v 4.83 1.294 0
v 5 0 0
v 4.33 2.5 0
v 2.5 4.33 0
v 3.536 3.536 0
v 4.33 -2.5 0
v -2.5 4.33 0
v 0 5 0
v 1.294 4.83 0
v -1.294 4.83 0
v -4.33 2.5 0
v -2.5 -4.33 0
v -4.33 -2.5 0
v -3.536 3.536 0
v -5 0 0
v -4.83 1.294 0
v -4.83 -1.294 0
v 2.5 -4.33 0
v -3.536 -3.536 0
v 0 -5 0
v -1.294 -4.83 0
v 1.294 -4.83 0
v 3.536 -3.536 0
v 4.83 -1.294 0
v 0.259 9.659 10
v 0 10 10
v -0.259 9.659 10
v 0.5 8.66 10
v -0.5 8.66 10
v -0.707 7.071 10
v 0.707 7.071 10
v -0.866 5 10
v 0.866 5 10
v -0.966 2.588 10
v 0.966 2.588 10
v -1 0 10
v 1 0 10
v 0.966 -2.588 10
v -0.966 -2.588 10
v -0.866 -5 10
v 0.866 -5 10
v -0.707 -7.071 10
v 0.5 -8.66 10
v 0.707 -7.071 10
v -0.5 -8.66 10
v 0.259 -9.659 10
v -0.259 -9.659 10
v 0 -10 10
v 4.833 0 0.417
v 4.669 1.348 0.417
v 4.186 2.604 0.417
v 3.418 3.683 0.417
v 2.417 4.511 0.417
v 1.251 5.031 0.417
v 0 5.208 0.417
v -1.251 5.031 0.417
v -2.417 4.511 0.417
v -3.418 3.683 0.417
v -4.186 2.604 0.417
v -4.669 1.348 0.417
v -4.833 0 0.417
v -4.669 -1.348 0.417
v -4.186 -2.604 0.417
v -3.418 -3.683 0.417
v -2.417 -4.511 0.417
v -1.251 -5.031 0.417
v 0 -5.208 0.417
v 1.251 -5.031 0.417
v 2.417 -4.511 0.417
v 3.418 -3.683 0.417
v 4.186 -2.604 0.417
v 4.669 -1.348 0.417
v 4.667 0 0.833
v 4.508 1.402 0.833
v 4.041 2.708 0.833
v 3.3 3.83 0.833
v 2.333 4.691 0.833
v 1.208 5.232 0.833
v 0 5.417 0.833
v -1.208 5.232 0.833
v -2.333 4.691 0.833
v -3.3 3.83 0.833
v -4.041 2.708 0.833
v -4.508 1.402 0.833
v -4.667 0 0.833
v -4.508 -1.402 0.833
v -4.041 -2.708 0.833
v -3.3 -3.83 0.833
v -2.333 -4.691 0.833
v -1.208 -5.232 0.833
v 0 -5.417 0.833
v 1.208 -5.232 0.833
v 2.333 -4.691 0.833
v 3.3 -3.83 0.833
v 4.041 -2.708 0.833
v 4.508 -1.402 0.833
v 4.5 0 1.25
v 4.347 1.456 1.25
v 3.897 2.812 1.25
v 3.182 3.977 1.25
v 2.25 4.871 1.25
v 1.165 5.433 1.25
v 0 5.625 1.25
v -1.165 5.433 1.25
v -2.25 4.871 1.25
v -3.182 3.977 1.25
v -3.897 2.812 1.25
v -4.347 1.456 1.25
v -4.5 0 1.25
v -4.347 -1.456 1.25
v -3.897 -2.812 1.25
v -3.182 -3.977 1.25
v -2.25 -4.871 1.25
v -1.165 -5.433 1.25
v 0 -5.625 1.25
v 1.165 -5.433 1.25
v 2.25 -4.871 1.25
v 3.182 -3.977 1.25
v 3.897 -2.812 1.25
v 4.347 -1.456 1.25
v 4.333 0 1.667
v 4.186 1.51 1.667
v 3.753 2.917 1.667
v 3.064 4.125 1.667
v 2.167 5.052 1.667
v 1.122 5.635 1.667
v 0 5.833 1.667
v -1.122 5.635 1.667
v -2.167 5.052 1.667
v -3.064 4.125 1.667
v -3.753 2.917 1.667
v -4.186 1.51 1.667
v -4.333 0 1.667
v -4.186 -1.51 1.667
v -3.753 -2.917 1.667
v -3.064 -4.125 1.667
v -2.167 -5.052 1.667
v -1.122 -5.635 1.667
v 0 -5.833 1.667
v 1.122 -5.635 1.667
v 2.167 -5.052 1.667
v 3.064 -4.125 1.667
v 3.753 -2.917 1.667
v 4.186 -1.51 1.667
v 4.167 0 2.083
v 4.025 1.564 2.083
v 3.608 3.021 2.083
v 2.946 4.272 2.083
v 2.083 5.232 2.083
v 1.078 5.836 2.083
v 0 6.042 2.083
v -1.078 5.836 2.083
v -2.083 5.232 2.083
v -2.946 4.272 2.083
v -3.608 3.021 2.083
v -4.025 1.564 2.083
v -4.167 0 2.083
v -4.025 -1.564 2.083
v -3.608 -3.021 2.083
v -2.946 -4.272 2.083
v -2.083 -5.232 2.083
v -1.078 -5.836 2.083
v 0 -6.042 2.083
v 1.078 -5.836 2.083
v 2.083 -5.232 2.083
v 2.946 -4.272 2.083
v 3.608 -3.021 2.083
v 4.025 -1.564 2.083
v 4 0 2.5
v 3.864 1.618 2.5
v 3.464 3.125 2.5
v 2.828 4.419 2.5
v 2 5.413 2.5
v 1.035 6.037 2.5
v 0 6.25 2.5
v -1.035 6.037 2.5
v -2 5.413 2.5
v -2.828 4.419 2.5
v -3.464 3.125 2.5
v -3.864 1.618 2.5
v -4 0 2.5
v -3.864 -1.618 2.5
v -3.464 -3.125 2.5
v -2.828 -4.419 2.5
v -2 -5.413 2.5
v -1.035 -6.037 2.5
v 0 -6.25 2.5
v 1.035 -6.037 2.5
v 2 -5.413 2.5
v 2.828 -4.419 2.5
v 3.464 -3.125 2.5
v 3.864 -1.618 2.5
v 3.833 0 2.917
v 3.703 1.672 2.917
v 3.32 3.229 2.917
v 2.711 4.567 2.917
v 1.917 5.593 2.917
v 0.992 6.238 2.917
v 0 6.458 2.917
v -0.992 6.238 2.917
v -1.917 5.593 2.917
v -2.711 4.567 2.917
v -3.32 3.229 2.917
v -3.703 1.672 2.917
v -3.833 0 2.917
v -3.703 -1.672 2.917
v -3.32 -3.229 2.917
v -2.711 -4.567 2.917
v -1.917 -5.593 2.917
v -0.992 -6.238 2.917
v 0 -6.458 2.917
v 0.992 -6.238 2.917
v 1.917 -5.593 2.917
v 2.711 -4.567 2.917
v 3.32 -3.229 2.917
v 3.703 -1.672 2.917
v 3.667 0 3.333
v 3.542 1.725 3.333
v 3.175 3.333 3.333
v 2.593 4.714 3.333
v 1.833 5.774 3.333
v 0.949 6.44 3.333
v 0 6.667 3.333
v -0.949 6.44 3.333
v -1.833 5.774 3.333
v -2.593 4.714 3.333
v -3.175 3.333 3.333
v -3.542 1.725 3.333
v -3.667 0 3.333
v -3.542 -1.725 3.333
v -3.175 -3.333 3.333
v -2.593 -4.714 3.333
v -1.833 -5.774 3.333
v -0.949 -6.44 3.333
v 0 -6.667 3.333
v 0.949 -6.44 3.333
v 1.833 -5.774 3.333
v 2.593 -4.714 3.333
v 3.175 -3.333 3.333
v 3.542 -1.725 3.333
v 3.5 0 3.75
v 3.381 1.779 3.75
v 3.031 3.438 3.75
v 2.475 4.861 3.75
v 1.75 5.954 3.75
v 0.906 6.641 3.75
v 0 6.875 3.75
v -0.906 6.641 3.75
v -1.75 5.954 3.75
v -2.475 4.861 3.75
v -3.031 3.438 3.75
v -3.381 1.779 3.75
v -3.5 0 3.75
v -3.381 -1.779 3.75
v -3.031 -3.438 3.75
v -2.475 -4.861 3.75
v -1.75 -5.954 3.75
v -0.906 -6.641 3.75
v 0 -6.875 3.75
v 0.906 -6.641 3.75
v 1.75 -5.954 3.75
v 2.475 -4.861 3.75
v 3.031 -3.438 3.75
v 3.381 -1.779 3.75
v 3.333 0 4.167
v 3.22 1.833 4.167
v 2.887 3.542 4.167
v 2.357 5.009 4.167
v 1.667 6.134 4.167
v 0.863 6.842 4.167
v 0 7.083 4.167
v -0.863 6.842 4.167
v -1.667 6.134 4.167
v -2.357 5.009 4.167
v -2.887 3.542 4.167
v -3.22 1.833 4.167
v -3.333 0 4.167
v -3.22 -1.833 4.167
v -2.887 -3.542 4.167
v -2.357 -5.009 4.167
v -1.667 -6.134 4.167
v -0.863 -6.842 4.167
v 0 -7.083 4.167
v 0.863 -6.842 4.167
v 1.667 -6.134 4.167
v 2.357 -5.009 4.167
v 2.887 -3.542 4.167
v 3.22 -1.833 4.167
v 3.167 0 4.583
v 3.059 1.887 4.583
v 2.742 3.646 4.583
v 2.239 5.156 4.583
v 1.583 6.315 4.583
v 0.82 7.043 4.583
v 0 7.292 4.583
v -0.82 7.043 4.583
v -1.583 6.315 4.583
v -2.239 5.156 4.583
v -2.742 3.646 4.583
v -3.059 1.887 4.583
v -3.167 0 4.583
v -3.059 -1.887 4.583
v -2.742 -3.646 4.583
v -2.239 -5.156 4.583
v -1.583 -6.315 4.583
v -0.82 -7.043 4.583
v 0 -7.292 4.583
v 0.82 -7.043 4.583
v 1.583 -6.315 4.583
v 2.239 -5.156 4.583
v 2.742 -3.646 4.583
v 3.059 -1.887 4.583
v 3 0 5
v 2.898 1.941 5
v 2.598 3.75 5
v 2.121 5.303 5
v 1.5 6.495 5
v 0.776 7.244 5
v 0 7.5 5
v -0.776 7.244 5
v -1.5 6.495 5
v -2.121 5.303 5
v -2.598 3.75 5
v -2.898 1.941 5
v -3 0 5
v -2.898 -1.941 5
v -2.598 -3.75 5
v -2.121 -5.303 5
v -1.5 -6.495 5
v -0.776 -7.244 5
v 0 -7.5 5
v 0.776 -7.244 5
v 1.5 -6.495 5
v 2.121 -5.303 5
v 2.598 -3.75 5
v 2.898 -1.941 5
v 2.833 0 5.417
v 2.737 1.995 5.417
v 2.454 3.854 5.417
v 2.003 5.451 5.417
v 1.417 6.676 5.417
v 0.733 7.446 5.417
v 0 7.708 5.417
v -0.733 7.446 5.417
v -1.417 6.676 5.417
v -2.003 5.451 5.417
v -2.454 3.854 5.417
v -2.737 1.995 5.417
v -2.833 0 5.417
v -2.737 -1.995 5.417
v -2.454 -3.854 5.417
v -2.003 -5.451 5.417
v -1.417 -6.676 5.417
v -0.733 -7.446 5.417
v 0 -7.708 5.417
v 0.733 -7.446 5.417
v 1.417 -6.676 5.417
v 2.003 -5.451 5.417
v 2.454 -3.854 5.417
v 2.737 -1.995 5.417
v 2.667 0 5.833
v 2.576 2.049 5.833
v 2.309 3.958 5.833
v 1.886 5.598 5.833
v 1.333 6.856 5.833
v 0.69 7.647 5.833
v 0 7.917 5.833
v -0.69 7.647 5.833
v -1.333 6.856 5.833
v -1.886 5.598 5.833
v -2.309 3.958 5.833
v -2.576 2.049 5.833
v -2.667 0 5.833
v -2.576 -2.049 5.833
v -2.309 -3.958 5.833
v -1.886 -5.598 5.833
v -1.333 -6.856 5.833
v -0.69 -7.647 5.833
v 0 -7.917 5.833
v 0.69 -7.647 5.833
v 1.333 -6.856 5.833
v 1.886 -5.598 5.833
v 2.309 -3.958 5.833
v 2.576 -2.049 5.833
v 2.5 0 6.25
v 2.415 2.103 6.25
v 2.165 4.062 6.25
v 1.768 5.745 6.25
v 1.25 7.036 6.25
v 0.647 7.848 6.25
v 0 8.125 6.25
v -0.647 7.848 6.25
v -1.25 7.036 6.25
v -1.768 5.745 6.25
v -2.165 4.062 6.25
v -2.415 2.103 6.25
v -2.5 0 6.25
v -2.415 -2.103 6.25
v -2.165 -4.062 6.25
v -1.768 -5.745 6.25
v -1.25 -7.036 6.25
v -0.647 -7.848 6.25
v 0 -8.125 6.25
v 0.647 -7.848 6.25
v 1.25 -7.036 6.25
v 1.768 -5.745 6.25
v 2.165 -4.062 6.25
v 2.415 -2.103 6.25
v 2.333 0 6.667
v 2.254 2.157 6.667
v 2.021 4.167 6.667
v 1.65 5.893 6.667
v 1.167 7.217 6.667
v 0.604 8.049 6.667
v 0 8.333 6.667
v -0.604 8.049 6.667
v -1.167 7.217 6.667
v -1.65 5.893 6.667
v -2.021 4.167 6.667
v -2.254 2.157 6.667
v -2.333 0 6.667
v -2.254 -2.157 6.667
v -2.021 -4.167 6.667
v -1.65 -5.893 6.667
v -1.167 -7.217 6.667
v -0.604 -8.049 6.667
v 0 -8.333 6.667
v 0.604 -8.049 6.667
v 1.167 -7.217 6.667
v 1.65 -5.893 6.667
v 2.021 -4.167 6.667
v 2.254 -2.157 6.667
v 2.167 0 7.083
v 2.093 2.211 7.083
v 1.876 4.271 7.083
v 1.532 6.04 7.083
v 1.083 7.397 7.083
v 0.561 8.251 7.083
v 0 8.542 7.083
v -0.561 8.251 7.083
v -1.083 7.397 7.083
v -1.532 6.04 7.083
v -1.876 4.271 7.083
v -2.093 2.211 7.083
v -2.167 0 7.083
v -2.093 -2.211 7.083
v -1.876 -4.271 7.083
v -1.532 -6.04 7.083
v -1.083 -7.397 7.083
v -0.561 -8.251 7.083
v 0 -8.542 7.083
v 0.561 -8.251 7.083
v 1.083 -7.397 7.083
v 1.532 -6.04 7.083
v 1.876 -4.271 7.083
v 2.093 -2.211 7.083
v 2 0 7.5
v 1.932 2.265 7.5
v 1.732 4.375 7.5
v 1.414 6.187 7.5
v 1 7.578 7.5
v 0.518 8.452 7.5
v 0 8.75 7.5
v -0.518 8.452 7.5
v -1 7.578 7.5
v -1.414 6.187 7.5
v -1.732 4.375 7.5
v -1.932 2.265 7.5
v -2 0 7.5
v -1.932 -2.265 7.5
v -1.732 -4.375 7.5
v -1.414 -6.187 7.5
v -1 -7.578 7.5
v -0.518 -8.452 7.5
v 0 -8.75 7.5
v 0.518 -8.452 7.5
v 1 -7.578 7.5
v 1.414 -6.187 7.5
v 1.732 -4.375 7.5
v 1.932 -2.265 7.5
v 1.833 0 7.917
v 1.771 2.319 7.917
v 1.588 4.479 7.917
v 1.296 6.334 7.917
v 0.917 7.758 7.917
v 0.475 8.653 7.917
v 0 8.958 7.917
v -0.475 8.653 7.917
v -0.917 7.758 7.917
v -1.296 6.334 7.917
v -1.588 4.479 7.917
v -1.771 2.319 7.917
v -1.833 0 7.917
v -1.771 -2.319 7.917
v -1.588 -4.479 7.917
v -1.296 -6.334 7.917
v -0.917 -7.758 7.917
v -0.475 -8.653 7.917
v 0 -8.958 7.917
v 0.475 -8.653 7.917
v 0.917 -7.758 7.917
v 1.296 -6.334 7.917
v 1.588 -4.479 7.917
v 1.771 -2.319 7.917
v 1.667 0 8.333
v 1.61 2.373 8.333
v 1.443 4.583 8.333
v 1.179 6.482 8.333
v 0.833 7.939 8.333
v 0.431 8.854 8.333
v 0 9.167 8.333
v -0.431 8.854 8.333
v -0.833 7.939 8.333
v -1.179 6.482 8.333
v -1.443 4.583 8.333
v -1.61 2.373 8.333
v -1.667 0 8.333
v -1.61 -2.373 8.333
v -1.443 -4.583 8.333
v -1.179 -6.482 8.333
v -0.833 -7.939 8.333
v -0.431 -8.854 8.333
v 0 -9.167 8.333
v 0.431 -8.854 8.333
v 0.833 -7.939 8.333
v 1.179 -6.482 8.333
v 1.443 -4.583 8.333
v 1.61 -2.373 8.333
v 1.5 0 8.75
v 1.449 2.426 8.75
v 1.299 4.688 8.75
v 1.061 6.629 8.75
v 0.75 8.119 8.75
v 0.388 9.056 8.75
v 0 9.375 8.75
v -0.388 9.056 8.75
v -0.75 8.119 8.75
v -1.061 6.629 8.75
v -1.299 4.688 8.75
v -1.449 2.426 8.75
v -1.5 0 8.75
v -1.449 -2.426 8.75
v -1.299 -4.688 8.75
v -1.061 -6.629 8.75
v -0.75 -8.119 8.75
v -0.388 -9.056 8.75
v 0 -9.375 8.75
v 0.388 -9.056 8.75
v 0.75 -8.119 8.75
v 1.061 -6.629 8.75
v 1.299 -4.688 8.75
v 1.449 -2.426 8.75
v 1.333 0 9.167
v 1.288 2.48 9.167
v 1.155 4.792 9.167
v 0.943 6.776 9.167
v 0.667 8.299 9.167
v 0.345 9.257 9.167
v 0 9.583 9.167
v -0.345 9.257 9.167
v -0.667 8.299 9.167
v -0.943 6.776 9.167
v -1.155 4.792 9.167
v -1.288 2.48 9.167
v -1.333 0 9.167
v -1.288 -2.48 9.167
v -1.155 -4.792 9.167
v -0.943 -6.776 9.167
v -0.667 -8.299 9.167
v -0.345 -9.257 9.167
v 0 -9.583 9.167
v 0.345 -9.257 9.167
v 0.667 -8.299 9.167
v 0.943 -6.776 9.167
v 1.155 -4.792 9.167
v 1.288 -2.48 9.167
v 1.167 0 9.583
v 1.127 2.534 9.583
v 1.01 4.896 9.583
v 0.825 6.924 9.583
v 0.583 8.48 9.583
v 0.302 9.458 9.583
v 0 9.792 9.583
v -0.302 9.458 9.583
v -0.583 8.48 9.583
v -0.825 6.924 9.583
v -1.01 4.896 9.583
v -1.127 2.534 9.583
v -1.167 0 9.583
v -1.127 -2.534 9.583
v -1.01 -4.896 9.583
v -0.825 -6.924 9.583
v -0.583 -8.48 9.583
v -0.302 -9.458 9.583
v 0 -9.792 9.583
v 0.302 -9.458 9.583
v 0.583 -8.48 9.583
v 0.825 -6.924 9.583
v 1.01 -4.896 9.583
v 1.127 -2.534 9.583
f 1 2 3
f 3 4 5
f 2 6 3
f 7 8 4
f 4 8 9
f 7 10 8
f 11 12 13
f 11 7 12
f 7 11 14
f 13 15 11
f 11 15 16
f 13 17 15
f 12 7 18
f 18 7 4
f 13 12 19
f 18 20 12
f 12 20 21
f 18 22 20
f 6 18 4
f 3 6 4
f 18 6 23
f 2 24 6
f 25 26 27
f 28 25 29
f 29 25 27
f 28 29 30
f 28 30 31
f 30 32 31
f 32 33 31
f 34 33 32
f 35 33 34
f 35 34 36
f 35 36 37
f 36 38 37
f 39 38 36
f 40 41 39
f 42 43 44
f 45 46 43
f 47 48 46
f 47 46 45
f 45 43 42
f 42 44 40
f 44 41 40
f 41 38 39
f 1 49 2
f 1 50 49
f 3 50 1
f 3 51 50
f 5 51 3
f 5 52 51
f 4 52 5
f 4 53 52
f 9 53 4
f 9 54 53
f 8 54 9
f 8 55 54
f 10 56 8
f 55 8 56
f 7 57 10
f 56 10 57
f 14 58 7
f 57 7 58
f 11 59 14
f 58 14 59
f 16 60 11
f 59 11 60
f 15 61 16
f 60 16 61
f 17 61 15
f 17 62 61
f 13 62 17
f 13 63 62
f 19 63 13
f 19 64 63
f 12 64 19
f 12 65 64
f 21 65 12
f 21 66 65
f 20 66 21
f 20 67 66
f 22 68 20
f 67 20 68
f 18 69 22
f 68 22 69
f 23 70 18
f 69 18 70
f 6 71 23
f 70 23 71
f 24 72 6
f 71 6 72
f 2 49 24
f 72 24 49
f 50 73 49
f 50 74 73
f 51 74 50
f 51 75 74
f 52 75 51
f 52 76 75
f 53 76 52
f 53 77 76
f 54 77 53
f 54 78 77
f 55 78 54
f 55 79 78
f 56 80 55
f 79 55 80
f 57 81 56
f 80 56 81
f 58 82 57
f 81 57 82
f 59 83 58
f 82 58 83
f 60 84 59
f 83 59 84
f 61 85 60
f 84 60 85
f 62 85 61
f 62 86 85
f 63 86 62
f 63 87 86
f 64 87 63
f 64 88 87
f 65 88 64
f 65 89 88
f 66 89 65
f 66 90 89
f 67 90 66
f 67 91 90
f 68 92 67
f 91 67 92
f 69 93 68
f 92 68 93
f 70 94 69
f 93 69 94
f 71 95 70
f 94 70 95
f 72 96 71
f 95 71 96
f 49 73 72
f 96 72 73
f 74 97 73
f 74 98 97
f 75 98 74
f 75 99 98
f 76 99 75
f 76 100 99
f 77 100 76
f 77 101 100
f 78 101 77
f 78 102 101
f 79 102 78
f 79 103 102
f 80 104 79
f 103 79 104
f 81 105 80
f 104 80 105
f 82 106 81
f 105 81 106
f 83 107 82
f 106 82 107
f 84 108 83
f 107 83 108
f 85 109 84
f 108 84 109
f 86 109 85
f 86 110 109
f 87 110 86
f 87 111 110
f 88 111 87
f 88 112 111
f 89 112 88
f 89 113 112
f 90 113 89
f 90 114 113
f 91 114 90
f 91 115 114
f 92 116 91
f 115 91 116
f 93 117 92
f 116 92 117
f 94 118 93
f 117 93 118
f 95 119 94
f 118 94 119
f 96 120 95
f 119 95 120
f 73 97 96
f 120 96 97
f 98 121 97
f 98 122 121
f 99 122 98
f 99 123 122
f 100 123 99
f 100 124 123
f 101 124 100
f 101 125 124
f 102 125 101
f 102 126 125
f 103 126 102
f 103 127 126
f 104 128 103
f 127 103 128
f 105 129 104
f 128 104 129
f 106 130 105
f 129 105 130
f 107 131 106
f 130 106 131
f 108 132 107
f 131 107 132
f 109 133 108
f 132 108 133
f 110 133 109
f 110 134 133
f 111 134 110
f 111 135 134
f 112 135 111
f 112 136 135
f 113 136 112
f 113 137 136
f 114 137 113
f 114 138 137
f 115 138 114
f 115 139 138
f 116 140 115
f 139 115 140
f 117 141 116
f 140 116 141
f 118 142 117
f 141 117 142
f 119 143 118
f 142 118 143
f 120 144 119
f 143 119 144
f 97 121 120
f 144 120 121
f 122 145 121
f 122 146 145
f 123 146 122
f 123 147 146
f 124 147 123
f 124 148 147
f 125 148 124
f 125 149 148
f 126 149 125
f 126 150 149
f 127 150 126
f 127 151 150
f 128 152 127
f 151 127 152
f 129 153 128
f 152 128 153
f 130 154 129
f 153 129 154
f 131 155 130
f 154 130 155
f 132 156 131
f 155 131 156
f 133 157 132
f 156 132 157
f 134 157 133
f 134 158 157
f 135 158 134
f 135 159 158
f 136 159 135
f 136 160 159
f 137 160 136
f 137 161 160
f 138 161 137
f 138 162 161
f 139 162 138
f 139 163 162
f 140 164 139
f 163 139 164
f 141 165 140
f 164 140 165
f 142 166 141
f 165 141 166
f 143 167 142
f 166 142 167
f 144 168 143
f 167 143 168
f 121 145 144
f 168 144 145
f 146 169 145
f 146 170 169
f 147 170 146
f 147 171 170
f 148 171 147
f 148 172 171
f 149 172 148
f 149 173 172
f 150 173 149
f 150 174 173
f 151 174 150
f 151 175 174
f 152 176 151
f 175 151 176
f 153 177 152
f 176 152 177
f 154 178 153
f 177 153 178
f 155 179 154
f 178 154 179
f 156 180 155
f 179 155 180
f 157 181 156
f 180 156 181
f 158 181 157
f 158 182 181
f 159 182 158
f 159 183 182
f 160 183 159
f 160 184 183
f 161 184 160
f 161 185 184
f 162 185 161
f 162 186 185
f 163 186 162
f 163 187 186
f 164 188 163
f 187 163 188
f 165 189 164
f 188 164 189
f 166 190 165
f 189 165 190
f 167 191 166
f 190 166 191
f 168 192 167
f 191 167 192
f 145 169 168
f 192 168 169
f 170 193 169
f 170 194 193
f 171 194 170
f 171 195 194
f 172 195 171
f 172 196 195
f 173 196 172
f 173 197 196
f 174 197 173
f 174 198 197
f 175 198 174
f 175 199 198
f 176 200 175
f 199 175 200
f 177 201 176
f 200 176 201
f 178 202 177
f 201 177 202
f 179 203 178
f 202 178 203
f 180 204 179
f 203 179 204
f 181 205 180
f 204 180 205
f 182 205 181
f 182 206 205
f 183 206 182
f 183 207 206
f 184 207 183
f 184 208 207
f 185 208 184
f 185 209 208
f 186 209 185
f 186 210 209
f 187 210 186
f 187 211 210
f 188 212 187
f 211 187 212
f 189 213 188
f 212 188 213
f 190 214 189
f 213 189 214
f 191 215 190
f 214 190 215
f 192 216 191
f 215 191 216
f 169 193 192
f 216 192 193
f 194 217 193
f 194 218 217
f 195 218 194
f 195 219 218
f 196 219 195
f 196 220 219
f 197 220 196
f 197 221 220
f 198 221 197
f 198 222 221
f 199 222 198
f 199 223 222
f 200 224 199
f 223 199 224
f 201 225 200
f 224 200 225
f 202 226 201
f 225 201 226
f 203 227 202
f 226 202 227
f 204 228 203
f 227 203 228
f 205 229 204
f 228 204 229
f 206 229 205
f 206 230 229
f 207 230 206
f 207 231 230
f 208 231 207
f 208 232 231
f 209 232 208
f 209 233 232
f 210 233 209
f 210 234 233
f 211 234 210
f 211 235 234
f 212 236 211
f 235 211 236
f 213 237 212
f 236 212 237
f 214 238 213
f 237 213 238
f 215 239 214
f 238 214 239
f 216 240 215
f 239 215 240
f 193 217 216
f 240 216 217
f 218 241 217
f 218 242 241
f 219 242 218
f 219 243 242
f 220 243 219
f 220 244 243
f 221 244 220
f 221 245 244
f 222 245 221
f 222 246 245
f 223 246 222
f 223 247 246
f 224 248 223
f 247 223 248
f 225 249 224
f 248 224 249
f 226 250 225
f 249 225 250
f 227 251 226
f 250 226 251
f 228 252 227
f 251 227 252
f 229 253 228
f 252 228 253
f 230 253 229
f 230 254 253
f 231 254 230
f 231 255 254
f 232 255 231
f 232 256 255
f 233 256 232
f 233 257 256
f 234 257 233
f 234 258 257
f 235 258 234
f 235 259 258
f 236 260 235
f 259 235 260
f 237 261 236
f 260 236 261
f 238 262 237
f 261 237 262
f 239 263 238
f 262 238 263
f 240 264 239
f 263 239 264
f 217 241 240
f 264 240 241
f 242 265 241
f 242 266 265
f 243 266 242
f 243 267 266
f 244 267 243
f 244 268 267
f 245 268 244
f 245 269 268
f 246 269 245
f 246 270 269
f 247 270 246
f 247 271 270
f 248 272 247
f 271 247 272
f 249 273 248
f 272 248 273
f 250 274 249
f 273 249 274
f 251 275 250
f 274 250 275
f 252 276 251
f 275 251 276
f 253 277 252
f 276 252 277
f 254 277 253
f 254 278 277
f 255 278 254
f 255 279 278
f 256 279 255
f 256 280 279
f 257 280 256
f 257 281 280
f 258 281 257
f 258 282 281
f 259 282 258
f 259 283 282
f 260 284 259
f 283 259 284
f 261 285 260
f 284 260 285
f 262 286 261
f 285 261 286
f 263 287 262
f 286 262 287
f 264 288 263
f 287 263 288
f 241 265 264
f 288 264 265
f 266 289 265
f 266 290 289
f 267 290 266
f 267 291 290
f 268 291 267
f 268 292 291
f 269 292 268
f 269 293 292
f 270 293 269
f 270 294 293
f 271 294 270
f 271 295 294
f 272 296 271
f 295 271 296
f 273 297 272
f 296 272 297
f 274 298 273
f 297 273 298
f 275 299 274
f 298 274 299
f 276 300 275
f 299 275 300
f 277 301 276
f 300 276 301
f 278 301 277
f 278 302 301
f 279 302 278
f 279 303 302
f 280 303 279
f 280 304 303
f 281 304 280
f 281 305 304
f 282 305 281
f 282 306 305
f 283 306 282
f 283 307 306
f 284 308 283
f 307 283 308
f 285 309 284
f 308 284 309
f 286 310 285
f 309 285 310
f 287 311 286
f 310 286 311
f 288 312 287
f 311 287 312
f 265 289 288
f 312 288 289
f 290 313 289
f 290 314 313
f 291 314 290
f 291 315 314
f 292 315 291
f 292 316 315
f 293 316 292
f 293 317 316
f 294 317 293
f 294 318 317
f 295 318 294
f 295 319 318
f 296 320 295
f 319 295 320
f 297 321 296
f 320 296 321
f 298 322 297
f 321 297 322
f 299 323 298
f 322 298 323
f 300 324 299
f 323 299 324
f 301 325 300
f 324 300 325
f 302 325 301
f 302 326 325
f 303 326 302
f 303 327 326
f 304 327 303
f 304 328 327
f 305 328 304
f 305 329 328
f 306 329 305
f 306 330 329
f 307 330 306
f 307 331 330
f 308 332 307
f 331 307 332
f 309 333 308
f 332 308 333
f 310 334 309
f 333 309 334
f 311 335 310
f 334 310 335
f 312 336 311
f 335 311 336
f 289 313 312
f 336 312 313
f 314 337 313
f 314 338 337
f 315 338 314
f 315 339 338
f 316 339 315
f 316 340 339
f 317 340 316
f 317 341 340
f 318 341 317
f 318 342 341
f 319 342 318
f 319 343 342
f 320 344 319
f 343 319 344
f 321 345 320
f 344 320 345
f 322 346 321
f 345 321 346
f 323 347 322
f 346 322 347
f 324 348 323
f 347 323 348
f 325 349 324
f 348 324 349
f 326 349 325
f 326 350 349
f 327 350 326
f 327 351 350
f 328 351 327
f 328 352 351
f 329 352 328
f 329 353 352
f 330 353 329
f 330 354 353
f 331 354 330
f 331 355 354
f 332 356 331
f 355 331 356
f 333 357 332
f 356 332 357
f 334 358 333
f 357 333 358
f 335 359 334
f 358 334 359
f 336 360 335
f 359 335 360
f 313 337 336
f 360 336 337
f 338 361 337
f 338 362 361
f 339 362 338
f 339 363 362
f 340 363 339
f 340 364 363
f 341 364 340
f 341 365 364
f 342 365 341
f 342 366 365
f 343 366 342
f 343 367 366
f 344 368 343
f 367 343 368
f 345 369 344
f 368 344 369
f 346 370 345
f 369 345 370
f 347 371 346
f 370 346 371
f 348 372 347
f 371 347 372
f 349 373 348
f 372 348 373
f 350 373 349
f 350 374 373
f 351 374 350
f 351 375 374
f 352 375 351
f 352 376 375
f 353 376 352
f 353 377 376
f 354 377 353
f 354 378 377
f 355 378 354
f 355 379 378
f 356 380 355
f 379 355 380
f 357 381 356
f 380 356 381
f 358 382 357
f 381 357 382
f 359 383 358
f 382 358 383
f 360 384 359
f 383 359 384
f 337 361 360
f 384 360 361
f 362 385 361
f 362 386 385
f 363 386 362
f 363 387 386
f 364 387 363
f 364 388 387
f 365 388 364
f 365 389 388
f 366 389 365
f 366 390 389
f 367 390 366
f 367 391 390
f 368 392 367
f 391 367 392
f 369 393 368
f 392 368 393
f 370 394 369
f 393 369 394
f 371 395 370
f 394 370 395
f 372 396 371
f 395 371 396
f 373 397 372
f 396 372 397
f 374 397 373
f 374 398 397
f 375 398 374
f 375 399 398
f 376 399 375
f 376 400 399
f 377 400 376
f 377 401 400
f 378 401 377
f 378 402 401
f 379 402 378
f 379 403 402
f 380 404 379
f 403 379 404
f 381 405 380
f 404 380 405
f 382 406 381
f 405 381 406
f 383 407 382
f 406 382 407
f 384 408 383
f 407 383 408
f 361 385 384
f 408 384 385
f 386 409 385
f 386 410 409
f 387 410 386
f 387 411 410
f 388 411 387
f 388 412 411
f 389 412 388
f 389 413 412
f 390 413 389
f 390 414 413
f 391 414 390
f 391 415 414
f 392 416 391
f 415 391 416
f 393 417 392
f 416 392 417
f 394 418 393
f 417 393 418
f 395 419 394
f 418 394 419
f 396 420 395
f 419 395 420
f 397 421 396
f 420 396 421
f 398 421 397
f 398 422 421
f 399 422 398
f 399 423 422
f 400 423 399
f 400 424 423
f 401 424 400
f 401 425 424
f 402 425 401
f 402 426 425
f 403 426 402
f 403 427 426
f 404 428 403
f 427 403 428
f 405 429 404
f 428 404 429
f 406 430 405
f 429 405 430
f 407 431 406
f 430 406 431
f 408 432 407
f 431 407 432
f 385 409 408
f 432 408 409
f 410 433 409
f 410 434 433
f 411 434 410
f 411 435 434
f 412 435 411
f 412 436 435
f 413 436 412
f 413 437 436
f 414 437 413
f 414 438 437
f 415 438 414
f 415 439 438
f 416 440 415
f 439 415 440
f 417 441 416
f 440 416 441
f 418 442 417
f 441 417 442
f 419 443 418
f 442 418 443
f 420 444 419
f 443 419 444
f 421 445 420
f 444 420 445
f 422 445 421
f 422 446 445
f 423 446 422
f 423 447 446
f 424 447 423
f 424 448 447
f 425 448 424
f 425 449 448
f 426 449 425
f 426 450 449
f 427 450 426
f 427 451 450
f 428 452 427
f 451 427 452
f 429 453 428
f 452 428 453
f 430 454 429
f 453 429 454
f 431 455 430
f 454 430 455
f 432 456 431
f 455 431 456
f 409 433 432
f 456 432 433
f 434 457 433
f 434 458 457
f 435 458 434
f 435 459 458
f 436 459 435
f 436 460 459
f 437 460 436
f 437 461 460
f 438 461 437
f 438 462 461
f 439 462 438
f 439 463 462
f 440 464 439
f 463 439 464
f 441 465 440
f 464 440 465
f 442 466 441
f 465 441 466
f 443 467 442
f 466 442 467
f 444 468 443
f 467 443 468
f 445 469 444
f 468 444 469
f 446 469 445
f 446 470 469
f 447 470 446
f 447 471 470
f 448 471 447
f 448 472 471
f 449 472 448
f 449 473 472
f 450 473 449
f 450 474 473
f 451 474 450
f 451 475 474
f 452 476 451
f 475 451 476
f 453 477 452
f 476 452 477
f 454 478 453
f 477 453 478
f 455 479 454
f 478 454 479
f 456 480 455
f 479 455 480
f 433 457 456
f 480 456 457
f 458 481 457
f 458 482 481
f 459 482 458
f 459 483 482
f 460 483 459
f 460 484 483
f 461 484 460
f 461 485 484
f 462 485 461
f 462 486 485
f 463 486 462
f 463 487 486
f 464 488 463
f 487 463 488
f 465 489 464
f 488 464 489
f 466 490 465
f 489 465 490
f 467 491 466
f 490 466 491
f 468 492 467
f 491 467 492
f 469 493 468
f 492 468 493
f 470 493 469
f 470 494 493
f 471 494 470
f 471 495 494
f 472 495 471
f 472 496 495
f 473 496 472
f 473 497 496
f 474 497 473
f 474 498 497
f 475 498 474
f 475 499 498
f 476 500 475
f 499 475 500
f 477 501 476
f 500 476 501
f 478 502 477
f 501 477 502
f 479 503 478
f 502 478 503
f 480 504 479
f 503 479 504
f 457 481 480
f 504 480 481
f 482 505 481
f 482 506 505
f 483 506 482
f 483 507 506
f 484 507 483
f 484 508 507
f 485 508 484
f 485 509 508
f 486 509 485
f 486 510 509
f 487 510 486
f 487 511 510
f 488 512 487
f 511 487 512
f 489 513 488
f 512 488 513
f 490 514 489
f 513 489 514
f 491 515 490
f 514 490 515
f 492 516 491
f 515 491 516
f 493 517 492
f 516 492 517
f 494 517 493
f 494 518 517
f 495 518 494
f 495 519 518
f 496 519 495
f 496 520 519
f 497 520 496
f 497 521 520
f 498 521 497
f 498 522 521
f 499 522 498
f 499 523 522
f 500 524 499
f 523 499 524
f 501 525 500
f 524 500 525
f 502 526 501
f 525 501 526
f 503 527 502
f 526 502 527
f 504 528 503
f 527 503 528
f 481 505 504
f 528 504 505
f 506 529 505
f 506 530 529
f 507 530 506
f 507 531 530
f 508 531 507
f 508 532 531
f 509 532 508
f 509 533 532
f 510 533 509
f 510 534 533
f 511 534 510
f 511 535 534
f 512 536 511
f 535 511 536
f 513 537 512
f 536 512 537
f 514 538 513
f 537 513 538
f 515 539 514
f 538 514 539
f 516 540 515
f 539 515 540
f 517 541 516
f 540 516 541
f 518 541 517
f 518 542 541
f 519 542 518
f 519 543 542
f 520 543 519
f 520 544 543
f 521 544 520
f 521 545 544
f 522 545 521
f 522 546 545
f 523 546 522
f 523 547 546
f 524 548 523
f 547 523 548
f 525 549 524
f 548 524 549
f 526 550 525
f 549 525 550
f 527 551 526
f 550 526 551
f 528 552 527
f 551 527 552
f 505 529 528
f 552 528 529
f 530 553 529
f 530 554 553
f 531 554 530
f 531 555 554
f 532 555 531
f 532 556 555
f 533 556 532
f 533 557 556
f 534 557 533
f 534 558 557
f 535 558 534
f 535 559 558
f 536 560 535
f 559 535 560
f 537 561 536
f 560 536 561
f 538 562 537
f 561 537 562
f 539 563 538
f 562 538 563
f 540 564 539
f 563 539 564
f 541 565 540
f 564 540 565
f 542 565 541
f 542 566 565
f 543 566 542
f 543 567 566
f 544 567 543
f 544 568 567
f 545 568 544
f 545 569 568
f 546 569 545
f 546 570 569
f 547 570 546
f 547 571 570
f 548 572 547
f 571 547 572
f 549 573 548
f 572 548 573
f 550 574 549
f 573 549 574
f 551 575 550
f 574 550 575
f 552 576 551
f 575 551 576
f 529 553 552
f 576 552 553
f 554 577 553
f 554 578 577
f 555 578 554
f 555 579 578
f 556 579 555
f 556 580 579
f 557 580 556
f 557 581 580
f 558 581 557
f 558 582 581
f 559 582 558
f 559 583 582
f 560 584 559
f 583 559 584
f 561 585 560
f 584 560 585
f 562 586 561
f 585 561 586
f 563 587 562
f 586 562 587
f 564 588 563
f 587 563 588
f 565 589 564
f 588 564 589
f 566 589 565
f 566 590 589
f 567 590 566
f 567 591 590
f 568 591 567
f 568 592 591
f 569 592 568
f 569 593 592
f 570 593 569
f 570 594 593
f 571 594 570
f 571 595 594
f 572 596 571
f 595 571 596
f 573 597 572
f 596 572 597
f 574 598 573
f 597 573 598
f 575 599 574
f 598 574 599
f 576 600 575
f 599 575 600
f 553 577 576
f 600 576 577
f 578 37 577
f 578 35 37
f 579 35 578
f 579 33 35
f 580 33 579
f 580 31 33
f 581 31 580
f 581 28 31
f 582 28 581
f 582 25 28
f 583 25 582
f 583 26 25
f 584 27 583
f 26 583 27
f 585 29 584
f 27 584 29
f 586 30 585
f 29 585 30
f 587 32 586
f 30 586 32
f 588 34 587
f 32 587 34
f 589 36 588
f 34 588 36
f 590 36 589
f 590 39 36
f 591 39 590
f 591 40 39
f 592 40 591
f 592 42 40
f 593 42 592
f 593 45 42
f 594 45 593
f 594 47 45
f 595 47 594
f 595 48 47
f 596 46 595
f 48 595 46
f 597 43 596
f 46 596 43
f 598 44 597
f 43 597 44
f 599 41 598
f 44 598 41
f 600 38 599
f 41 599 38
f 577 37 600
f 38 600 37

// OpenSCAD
// Non-uniform scale on a curved profile: no two wall quads lean alike, which
// makes this the sharpest check that the diagonal is chosen per quad rather than
// per contour.
//
// oracle: tris
$fn = 24;
linear_extrude(height=10, scale=[0.2,2]) circle(5);
